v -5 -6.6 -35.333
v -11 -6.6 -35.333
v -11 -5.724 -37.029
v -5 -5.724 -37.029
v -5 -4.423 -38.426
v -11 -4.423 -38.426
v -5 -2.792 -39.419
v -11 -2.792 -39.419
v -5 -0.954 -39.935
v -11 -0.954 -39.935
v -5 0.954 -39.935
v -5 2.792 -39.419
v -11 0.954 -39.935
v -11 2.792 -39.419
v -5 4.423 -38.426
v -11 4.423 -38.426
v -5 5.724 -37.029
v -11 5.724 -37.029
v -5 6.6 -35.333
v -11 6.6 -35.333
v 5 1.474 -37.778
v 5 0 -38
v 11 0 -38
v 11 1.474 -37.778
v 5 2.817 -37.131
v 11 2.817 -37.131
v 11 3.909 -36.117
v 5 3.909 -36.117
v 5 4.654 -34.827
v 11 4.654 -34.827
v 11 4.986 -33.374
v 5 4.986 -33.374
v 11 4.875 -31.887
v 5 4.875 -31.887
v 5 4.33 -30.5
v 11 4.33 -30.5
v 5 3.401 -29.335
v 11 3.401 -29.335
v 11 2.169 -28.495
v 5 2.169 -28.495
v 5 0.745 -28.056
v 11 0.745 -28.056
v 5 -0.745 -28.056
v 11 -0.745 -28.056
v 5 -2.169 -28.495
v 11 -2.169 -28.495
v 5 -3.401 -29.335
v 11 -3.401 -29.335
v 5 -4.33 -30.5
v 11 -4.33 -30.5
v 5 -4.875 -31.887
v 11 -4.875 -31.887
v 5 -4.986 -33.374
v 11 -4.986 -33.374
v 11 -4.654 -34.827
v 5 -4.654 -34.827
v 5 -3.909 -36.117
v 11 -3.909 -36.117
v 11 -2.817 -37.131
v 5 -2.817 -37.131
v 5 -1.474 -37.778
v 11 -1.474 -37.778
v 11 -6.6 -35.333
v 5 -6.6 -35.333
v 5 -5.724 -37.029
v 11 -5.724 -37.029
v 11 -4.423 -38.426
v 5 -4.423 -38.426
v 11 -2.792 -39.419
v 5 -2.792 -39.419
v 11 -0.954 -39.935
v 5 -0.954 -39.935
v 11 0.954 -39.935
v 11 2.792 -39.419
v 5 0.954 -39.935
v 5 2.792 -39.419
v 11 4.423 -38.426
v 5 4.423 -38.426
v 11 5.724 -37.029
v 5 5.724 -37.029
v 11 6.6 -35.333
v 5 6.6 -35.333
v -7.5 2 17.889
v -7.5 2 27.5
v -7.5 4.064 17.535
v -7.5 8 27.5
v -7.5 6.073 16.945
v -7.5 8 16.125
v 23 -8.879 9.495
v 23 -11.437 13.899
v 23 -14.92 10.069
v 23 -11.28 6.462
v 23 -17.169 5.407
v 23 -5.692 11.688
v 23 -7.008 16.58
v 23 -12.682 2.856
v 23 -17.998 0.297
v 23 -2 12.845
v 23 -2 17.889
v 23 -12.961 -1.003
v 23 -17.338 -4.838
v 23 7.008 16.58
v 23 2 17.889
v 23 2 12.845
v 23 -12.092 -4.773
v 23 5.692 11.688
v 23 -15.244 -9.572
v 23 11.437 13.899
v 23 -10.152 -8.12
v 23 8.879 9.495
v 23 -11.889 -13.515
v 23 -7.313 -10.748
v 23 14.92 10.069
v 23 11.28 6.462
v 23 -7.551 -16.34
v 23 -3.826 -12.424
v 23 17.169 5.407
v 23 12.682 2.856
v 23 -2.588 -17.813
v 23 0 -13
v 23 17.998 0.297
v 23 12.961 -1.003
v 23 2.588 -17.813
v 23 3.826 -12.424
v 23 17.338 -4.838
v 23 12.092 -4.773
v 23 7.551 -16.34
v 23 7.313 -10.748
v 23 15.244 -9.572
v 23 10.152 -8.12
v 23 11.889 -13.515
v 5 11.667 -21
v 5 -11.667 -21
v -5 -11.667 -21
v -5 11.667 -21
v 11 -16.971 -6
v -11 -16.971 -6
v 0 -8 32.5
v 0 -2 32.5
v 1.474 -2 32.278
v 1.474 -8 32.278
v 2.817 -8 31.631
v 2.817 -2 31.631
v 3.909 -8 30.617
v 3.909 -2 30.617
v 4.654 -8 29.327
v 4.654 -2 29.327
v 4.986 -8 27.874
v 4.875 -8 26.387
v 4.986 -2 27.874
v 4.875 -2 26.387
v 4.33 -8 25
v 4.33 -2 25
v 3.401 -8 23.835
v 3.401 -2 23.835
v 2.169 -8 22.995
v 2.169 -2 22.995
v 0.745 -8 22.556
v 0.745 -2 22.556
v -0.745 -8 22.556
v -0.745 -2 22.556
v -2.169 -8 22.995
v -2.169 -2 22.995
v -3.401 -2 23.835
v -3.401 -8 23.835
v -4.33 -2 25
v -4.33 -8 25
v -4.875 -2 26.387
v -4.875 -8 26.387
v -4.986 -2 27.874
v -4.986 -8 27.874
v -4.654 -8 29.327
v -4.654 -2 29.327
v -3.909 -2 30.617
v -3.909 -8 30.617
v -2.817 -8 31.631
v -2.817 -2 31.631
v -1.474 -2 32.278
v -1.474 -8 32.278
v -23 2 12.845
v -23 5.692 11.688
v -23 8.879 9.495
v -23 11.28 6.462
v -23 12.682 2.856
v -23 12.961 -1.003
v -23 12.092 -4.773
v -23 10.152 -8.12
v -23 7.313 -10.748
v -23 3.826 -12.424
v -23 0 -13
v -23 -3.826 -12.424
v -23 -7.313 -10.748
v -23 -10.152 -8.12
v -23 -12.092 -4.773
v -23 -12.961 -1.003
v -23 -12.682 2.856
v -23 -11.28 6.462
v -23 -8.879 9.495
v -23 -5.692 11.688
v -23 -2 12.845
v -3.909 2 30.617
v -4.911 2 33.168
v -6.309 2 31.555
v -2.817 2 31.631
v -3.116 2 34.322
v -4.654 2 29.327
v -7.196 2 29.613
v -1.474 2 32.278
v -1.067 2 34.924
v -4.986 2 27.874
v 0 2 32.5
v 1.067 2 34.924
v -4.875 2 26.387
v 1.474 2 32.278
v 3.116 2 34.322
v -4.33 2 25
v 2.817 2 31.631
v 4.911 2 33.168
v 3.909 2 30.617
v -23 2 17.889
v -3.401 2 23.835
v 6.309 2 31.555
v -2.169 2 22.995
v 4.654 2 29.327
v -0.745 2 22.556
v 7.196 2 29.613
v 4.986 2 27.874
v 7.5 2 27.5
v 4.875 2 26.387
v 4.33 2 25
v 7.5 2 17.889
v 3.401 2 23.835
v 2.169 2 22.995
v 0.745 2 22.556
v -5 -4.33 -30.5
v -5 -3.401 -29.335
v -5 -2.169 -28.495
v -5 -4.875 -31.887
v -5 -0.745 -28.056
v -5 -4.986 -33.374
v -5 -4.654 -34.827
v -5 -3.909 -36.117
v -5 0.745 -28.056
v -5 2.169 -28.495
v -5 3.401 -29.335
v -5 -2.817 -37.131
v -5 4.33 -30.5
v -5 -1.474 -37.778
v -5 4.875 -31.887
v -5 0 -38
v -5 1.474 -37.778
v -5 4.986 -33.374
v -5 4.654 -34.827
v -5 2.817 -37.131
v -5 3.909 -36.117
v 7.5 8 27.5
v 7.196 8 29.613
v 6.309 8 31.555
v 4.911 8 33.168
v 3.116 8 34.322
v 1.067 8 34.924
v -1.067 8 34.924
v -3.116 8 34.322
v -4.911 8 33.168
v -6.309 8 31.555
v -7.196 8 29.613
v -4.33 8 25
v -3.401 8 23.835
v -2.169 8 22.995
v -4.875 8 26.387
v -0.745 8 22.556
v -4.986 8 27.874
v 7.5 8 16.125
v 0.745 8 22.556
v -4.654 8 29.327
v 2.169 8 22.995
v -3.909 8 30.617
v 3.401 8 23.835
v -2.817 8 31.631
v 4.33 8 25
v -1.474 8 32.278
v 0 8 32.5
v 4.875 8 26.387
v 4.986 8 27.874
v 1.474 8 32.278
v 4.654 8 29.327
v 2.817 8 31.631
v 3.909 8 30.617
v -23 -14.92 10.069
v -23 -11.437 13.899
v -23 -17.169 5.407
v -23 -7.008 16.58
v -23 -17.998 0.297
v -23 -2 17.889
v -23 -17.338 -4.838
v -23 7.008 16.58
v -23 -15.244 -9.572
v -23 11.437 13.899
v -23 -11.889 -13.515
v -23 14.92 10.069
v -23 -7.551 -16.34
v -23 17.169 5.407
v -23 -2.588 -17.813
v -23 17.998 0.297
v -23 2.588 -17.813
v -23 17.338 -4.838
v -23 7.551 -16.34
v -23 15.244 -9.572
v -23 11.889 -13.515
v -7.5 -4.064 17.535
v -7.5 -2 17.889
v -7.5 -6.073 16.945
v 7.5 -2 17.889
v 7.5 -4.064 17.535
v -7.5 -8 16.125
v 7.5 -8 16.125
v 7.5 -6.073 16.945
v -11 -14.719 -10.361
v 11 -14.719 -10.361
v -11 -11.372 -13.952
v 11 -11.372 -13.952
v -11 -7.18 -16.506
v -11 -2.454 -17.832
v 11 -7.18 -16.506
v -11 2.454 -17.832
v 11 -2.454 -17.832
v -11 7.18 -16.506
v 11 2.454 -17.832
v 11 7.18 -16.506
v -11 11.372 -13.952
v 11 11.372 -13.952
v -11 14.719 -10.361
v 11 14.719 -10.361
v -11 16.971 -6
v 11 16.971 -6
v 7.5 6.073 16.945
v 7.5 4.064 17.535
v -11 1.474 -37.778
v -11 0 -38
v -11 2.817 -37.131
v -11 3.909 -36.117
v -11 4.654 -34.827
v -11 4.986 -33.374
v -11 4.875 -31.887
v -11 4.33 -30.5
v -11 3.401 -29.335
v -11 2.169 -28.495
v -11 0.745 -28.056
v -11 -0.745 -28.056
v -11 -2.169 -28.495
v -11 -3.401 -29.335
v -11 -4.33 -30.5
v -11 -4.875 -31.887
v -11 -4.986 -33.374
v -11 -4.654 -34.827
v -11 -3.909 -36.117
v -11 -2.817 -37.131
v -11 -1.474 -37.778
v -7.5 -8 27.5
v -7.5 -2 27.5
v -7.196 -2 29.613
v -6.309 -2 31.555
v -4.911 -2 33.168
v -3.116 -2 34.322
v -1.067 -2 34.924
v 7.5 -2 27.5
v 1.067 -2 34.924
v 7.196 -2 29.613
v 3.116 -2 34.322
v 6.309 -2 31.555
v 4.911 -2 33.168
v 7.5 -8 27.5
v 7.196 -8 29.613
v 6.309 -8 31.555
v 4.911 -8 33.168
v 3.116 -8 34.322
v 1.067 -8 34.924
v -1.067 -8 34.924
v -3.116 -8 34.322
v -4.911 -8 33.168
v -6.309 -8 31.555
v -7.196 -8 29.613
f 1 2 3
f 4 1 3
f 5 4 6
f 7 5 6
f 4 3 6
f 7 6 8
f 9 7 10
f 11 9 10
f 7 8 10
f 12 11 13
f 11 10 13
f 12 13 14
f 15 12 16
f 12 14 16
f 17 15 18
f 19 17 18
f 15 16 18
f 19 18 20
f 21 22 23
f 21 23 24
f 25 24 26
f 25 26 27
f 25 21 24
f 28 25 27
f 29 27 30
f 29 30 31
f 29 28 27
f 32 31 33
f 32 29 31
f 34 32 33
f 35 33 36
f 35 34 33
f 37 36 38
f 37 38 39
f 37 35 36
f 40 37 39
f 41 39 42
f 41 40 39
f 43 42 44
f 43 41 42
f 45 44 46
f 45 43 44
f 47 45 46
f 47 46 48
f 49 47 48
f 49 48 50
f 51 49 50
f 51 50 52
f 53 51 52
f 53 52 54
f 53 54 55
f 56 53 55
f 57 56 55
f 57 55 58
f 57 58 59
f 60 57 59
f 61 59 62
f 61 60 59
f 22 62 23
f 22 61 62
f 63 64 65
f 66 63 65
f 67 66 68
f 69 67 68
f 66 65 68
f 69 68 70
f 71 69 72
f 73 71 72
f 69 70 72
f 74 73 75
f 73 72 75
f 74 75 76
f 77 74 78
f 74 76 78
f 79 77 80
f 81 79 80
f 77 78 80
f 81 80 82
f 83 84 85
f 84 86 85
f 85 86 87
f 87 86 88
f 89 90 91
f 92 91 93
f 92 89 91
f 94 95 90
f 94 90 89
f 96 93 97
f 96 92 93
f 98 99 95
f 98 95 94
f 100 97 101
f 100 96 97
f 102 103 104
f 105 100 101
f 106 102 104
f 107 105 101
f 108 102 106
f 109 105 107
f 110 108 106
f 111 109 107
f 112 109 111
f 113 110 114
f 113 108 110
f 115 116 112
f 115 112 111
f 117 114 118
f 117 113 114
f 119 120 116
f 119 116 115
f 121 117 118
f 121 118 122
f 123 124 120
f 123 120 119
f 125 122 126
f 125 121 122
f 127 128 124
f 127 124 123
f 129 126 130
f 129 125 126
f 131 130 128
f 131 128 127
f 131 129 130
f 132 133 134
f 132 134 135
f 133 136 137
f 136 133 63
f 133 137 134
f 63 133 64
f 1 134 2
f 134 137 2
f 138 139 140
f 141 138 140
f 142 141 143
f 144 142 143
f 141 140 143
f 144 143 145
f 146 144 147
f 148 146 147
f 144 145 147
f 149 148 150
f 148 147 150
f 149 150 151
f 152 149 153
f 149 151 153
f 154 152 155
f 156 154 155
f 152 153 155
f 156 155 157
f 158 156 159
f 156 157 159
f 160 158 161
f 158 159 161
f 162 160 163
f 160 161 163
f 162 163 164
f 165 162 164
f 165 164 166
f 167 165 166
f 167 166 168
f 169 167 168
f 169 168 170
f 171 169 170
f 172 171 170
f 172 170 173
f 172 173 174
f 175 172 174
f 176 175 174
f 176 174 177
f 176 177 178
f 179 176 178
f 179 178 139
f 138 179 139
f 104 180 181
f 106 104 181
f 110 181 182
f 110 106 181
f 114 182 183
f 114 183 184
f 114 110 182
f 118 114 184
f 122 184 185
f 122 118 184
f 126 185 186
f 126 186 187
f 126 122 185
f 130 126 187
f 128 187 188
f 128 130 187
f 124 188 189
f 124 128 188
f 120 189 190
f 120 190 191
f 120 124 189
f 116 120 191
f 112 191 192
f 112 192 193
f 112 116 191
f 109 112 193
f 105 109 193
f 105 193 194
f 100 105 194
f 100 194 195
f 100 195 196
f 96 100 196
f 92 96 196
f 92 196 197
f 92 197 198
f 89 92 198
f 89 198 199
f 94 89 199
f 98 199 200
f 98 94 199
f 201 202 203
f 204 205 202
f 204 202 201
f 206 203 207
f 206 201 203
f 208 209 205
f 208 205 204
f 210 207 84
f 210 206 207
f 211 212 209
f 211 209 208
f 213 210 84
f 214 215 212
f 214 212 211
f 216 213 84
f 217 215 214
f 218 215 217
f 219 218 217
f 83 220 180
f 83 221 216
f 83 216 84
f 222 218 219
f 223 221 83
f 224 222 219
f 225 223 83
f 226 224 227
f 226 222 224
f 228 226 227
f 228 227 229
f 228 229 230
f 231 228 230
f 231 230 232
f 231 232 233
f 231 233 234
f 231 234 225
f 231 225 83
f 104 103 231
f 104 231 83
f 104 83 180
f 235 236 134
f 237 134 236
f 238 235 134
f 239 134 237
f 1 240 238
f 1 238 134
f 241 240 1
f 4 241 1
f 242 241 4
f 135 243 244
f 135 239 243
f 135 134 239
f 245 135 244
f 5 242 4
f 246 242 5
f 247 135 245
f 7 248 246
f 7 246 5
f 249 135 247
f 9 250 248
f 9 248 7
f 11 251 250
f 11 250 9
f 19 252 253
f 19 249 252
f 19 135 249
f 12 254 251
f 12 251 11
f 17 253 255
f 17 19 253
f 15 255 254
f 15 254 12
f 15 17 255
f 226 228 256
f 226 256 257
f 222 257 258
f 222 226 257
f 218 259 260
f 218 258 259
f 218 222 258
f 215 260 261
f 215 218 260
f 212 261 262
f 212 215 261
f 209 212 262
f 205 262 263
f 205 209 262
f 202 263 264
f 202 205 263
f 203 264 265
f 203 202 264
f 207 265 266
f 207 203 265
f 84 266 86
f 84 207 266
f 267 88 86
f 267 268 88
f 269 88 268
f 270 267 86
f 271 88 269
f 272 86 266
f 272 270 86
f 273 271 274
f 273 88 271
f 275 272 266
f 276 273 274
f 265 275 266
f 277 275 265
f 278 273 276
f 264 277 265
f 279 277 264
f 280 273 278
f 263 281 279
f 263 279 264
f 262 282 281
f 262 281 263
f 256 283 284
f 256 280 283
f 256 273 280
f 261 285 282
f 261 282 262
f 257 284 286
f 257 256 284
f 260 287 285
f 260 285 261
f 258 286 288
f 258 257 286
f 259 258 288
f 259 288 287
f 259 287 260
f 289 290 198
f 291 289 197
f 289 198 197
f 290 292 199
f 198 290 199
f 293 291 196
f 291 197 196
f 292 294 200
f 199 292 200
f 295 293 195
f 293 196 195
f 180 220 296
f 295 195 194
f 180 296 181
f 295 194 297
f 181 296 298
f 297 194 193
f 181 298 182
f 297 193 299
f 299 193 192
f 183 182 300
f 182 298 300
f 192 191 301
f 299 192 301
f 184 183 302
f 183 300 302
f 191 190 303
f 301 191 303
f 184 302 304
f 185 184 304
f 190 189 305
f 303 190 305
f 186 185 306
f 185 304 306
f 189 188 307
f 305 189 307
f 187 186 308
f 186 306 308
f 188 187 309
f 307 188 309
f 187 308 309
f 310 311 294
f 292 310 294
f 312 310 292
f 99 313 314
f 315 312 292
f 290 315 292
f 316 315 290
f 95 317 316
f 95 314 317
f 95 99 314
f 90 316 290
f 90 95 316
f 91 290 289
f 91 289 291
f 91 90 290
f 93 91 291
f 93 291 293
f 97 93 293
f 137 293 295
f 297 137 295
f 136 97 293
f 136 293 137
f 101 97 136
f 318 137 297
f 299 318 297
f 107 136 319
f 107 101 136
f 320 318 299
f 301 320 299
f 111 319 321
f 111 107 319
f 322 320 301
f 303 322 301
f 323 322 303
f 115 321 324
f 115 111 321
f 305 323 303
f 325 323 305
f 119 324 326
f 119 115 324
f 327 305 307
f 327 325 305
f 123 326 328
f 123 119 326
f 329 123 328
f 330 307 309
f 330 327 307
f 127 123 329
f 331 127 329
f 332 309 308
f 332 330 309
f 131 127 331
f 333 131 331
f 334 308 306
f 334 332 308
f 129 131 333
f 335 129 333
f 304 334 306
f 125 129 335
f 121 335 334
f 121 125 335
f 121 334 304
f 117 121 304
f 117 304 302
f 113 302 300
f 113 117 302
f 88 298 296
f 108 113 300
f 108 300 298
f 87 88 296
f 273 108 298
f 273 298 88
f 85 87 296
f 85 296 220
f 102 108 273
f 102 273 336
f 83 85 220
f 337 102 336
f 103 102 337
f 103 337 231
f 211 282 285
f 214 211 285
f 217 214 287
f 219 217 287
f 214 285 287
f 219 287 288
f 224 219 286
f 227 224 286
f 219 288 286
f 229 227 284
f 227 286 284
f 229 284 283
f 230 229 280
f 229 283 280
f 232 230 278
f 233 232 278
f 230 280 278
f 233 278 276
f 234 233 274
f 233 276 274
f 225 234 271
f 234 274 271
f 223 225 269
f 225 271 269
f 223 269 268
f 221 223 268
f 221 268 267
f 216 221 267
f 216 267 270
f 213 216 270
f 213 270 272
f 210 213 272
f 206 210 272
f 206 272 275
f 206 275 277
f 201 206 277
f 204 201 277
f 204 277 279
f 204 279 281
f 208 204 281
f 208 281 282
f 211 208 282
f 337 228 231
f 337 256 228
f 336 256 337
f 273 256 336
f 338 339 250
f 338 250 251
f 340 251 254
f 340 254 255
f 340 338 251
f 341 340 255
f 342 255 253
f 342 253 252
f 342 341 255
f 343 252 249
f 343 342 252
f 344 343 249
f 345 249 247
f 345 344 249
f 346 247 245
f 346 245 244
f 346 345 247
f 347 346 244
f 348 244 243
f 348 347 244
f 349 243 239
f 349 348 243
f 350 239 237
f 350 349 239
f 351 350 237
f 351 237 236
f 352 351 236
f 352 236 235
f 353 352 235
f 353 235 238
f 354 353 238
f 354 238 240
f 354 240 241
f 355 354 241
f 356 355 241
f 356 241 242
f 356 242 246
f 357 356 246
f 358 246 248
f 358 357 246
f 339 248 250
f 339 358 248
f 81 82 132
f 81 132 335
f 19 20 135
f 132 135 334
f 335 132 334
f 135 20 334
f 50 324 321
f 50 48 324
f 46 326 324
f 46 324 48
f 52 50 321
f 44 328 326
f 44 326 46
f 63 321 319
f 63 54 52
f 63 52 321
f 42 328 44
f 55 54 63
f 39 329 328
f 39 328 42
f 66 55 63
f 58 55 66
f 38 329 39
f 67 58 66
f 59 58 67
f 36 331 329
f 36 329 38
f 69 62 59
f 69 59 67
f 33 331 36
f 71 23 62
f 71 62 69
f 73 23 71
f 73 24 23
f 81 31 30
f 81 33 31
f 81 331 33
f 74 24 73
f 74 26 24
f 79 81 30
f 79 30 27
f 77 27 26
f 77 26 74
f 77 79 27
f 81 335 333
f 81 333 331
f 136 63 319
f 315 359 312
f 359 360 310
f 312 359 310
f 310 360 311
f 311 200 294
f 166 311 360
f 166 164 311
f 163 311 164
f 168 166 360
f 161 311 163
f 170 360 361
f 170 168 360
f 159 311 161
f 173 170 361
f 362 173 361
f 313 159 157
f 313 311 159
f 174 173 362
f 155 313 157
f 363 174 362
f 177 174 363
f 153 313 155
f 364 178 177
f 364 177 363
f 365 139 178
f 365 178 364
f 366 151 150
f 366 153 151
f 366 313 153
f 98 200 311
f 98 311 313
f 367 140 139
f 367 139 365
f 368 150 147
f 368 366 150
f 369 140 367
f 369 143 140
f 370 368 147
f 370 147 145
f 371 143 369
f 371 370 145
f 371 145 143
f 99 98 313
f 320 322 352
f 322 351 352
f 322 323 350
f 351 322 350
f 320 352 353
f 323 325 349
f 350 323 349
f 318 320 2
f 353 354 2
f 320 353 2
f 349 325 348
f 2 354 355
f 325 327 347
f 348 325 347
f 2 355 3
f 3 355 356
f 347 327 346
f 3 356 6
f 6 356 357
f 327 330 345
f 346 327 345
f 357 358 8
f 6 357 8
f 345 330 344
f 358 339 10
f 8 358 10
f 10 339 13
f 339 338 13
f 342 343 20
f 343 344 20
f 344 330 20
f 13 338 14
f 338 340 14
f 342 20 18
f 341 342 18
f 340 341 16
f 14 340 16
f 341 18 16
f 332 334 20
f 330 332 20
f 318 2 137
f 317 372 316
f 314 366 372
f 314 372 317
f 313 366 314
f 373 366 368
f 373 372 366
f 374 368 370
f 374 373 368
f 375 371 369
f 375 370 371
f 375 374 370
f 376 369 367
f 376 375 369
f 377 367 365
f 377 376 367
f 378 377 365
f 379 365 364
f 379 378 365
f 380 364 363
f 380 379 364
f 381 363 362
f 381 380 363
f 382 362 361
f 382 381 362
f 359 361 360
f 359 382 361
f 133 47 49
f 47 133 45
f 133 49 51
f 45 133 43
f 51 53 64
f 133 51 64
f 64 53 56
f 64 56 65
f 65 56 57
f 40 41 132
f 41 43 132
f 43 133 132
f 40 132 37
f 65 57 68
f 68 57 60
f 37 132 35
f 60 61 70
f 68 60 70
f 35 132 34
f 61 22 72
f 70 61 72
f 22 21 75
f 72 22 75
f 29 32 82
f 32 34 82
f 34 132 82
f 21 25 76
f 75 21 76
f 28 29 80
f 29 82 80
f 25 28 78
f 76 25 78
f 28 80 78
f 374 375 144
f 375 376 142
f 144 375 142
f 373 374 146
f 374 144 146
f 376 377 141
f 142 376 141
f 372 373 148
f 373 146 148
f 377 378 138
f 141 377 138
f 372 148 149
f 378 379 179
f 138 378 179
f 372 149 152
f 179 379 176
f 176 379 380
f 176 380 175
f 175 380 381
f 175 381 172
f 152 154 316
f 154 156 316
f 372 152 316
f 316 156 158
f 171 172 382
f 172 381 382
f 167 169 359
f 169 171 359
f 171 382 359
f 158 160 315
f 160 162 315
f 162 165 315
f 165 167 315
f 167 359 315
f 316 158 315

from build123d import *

# Parameters (mm, degrees)
BOSS_EXTRUDE1_DEPTH    = 23
BOSS_EXTRUDE2_DEPTH    = 11
BOSS_EXTRUDE3_START    = 5
SKETCH1_4_R            = 5.000000000000004
BOSS_EXTRUDE3_DEPTH    = 6
BOSS_EXTRUDE4_START    = -11
SKETCH1_5_R            = 5.000000000000004
BOSS_EXTRUDE4_DEPTH    = 6
BOSS_EXTRUDE5_DEPTH    = 7.5
FILLET1_RADIUS         = 7.5
FILLET1_LENGTH         = 6
FILLET2_RADIUS         = 7.5
FILLET2_LENGTH         = 6
F_10_0MM_DOWEL_HOLE1_D = 10


with BuildPart() as part:
    # Sketch1 → Boss-Extrude1 (new, symmetric)
    with BuildSketch(Plane(origin=(0, 0, 0), x_dir=(0, 0, -1), z_dir=(1, 0, 0))):
        with BuildLine():
            ThreePointArc((18, 0), (14.696938456699069, 10.392304845413266), (5.999999999999998, 16.97056274847714))
            ThreePointArc((5.999999999999998, 16.97056274847714), (-6.763446053329629, 16.68100109357049), (-16.1245154965971, 8.000000000000002))
            ThreePointArc((-16.1245154965971, 8.000000000000002), (-17.269106839051002, 5.077198930654761), (-17.888543819998286, 2.0000000000002958))
            Line((-17.888543819998254, 1.9999999999999998), (-12.845232578665128, 2.0000000000000004))
            ThreePointArc((-12.845232578665128, 2.0000000000000018), (1.0029896503337725, 12.96125039343517), (13, 0))
            ThreePointArc((13, -3.18e-15), (1.0029896503337692, -12.96125039343517), (-12.84523257866513, -1.9999999999999987))
            Line((-12.845232578665128, -2.0000000000000004), (-17.888543819998254, -1.9999999999999998))
            ThreePointArc((-17.888543819998286, -2.0000000000002918), (-17.269106839051005, -5.077198930654757), (-16.124515496597102, -7.999999999999997))
            ThreePointArc((-16.124515496597102, -7.999999999999997), (-6.763446053329637, -16.681001093570487), (5.999999999999995, -16.970562748477143))
            ThreePointArc((5.999999999999995, -16.970562748477143), (14.69693845669907, -10.39230484541326), (18, -4.41e-15))
        make_face()
    extrude(amount=BOSS_EXTRUDE1_DEPTH, both=True)

    # Sketch1<3> → Boss-Extrude2 (add, symmetric)
    with BuildSketch(Plane(origin=(0, 0, 0), x_dir=(0, 0, -1), z_dir=(1, 0, 0))):
        with BuildLine():
            Line((21.000000000000004, 11.667261889578032), (6, 16.97056274847714))
            ThreePointArc((5.999999999999998, 16.97056274847714), (14.696938456699069, 10.392304845413266), (18, 0))
            ThreePointArc((18, -4.41e-15), (14.69693845669907, -10.39230484541326), (5.999999999999995, -16.970562748477143))
            Line((6, -16.97056274847714), (21.000000000000004, -11.667261889578032))
            Line((21.000000000000004, -11.66726188957803), (21.000000000000004, 11.66726188957803))
        make_face()
    extrude(amount=BOSS_EXTRUDE2_DEPTH, both=True)

    # Sketch1<4> → Boss-Extrude3 (add)
    with BuildSketch(Plane(origin=(0, 0, 0), x_dir=(0, 0, -1), z_dir=(1, 0, 0)).offset(BOSS_EXTRUDE3_START)):
        with BuildLine():
            Line((35.333333333333336, 6.599663291074442), (21.000000000000004, 11.667261889578032))
            Line((21.000000000000004, 11.66726188957803), (21.000000000000004, -11.66726188957803))
            Line((21.000000000000004, -11.667261889578032), (35.333333333333336, -6.599663291074442))
            ThreePointArc((35.333333333333336, -6.59966329107444), (40, -2.2e-16), (35.333333333333336, 6.5996632910744415))
        make_face()
        with Locations((33, 0)):
            Circle(SKETCH1_4_R, mode=Mode.SUBTRACT)
    extrude(amount=BOSS_EXTRUDE3_DEPTH)

    # Sketch1<5> → Boss-Extrude4 (add)
    with BuildSketch(Plane(origin=(0, 0, 0), x_dir=(0, 0, -1), z_dir=(1, 0, 0)).offset(BOSS_EXTRUDE4_START)):
        with BuildLine():
            Line((35.333333333333336, 6.599663291074442), (21.000000000000004, 11.667261889578032))
            Line((21.000000000000004, 11.66726188957803), (21.000000000000004, -11.66726188957803))
            Line((21.000000000000004, -11.667261889578032), (35.333333333333336, -6.599663291074442))
            ThreePointArc((35.333333333333336, -6.59966329107444), (40, -2.2e-16), (35.333333333333336, 6.5996632910744415))
        make_face()
        with Locations((33, 0)):
            Circle(SKETCH1_5_R, mode=Mode.SUBTRACT)
    extrude(amount=BOSS_EXTRUDE4_DEPTH)

    # Sketch1<7> → Boss-Extrude5 (add, symmetric)
    with BuildSketch(Plane(origin=(0, 0, 0), x_dir=(0, 0, -1), z_dir=(1, 0, 0))):
        with BuildLine():
            Line((-35, -7.999999999999998), (-16.1245154965971, -7.9999999999999964))
            ThreePointArc((-16.124515496597102, -7.999999999999997), (-17.269106839051005, -5.077198930654757), (-17.888543819998286, -2.0000000000002918))
            Line((-17.888543819998254, -1.9999999999999998), (-35, -1.9999999999999973))
            Line((-35, -1.9999999999999973), (-35, -7.999999999999998))
        make_face()
        with BuildLine():
            ThreePointArc((-17.888543819998286, 2.0000000000002958), (-17.269106839051002, 5.077198930654761), (-16.1245154965971, 8.000000000000002))
            Line((-16.1245154965971, 7.9999999999999964), (-35, 7.999999999999998))
            Line((-35, 7.999999999999998), (-35, 1.9999999999999973))
            Line((-35, 1.9999999999999973), (-17.888543819998254, 1.9999999999999998))
        make_face()
    extrude(amount=BOSS_EXTRUDE5_DEPTH, both=True)

    # Fillet1: full round fillet: the end face becomes a half cylinder, R = half its width
    fillet1_face = Plane((0, -5, 35), x_dir=(0, -1, 0), z_dir=(0, 0, 1))  # on the end face: x along it, z out of the body
    fillet1_slab = fillet1_face.offset(-FILLET1_RADIUS / 2) * Box(FILLET1_LENGTH, 2 * FILLET1_RADIUS, FILLET1_RADIUS, mode=Mode.PRIVATE)  # the body's end, R deep
    fillet1_round = Plane((0, -5, 27.5), x_dir=(0, 0, 1), z_dir=(0, -1, 0)) * Cylinder(FILLET1_RADIUS, FILLET1_LENGTH, mode=Mode.PRIVATE)  # its axis R under the face
    add(fillet1_slab - fillet1_round, mode=Mode.SUBTRACT)

    # Fillet2: full round fillet: the end face becomes a half cylinder, R = half its width
    fillet2_face = Plane((0, 5, 35), x_dir=(0, -1, 0), z_dir=(0, 0, 1))  # on the end face: x along it, z out of the body
    fillet2_slab = fillet2_face.offset(-FILLET2_RADIUS / 2) * Box(FILLET2_LENGTH, 2 * FILLET2_RADIUS, FILLET2_RADIUS, mode=Mode.PRIVATE)  # the body's end, R deep
    fillet2_round = Plane((0, 5, 27.5), x_dir=(0, 0, 1), z_dir=(0, -1, 0)) * Cylinder(FILLET2_RADIUS, FILLET2_LENGTH, mode=Mode.PRIVATE)  # its axis R under the face
    add(fillet2_slab - fillet2_round, mode=Mode.SUBTRACT)

    # Ø10.0mm Dowel Hole1 (through all)
    with Locations(Plane(origin=(0, -8, 27.5), x_dir=(0, 0, -1), z_dir=(0, -1, 0))):
        with Locations((0, 0)):
            Hole(F_10_0MM_DOWEL_HOLE1_D / 2)


solid = part.part
